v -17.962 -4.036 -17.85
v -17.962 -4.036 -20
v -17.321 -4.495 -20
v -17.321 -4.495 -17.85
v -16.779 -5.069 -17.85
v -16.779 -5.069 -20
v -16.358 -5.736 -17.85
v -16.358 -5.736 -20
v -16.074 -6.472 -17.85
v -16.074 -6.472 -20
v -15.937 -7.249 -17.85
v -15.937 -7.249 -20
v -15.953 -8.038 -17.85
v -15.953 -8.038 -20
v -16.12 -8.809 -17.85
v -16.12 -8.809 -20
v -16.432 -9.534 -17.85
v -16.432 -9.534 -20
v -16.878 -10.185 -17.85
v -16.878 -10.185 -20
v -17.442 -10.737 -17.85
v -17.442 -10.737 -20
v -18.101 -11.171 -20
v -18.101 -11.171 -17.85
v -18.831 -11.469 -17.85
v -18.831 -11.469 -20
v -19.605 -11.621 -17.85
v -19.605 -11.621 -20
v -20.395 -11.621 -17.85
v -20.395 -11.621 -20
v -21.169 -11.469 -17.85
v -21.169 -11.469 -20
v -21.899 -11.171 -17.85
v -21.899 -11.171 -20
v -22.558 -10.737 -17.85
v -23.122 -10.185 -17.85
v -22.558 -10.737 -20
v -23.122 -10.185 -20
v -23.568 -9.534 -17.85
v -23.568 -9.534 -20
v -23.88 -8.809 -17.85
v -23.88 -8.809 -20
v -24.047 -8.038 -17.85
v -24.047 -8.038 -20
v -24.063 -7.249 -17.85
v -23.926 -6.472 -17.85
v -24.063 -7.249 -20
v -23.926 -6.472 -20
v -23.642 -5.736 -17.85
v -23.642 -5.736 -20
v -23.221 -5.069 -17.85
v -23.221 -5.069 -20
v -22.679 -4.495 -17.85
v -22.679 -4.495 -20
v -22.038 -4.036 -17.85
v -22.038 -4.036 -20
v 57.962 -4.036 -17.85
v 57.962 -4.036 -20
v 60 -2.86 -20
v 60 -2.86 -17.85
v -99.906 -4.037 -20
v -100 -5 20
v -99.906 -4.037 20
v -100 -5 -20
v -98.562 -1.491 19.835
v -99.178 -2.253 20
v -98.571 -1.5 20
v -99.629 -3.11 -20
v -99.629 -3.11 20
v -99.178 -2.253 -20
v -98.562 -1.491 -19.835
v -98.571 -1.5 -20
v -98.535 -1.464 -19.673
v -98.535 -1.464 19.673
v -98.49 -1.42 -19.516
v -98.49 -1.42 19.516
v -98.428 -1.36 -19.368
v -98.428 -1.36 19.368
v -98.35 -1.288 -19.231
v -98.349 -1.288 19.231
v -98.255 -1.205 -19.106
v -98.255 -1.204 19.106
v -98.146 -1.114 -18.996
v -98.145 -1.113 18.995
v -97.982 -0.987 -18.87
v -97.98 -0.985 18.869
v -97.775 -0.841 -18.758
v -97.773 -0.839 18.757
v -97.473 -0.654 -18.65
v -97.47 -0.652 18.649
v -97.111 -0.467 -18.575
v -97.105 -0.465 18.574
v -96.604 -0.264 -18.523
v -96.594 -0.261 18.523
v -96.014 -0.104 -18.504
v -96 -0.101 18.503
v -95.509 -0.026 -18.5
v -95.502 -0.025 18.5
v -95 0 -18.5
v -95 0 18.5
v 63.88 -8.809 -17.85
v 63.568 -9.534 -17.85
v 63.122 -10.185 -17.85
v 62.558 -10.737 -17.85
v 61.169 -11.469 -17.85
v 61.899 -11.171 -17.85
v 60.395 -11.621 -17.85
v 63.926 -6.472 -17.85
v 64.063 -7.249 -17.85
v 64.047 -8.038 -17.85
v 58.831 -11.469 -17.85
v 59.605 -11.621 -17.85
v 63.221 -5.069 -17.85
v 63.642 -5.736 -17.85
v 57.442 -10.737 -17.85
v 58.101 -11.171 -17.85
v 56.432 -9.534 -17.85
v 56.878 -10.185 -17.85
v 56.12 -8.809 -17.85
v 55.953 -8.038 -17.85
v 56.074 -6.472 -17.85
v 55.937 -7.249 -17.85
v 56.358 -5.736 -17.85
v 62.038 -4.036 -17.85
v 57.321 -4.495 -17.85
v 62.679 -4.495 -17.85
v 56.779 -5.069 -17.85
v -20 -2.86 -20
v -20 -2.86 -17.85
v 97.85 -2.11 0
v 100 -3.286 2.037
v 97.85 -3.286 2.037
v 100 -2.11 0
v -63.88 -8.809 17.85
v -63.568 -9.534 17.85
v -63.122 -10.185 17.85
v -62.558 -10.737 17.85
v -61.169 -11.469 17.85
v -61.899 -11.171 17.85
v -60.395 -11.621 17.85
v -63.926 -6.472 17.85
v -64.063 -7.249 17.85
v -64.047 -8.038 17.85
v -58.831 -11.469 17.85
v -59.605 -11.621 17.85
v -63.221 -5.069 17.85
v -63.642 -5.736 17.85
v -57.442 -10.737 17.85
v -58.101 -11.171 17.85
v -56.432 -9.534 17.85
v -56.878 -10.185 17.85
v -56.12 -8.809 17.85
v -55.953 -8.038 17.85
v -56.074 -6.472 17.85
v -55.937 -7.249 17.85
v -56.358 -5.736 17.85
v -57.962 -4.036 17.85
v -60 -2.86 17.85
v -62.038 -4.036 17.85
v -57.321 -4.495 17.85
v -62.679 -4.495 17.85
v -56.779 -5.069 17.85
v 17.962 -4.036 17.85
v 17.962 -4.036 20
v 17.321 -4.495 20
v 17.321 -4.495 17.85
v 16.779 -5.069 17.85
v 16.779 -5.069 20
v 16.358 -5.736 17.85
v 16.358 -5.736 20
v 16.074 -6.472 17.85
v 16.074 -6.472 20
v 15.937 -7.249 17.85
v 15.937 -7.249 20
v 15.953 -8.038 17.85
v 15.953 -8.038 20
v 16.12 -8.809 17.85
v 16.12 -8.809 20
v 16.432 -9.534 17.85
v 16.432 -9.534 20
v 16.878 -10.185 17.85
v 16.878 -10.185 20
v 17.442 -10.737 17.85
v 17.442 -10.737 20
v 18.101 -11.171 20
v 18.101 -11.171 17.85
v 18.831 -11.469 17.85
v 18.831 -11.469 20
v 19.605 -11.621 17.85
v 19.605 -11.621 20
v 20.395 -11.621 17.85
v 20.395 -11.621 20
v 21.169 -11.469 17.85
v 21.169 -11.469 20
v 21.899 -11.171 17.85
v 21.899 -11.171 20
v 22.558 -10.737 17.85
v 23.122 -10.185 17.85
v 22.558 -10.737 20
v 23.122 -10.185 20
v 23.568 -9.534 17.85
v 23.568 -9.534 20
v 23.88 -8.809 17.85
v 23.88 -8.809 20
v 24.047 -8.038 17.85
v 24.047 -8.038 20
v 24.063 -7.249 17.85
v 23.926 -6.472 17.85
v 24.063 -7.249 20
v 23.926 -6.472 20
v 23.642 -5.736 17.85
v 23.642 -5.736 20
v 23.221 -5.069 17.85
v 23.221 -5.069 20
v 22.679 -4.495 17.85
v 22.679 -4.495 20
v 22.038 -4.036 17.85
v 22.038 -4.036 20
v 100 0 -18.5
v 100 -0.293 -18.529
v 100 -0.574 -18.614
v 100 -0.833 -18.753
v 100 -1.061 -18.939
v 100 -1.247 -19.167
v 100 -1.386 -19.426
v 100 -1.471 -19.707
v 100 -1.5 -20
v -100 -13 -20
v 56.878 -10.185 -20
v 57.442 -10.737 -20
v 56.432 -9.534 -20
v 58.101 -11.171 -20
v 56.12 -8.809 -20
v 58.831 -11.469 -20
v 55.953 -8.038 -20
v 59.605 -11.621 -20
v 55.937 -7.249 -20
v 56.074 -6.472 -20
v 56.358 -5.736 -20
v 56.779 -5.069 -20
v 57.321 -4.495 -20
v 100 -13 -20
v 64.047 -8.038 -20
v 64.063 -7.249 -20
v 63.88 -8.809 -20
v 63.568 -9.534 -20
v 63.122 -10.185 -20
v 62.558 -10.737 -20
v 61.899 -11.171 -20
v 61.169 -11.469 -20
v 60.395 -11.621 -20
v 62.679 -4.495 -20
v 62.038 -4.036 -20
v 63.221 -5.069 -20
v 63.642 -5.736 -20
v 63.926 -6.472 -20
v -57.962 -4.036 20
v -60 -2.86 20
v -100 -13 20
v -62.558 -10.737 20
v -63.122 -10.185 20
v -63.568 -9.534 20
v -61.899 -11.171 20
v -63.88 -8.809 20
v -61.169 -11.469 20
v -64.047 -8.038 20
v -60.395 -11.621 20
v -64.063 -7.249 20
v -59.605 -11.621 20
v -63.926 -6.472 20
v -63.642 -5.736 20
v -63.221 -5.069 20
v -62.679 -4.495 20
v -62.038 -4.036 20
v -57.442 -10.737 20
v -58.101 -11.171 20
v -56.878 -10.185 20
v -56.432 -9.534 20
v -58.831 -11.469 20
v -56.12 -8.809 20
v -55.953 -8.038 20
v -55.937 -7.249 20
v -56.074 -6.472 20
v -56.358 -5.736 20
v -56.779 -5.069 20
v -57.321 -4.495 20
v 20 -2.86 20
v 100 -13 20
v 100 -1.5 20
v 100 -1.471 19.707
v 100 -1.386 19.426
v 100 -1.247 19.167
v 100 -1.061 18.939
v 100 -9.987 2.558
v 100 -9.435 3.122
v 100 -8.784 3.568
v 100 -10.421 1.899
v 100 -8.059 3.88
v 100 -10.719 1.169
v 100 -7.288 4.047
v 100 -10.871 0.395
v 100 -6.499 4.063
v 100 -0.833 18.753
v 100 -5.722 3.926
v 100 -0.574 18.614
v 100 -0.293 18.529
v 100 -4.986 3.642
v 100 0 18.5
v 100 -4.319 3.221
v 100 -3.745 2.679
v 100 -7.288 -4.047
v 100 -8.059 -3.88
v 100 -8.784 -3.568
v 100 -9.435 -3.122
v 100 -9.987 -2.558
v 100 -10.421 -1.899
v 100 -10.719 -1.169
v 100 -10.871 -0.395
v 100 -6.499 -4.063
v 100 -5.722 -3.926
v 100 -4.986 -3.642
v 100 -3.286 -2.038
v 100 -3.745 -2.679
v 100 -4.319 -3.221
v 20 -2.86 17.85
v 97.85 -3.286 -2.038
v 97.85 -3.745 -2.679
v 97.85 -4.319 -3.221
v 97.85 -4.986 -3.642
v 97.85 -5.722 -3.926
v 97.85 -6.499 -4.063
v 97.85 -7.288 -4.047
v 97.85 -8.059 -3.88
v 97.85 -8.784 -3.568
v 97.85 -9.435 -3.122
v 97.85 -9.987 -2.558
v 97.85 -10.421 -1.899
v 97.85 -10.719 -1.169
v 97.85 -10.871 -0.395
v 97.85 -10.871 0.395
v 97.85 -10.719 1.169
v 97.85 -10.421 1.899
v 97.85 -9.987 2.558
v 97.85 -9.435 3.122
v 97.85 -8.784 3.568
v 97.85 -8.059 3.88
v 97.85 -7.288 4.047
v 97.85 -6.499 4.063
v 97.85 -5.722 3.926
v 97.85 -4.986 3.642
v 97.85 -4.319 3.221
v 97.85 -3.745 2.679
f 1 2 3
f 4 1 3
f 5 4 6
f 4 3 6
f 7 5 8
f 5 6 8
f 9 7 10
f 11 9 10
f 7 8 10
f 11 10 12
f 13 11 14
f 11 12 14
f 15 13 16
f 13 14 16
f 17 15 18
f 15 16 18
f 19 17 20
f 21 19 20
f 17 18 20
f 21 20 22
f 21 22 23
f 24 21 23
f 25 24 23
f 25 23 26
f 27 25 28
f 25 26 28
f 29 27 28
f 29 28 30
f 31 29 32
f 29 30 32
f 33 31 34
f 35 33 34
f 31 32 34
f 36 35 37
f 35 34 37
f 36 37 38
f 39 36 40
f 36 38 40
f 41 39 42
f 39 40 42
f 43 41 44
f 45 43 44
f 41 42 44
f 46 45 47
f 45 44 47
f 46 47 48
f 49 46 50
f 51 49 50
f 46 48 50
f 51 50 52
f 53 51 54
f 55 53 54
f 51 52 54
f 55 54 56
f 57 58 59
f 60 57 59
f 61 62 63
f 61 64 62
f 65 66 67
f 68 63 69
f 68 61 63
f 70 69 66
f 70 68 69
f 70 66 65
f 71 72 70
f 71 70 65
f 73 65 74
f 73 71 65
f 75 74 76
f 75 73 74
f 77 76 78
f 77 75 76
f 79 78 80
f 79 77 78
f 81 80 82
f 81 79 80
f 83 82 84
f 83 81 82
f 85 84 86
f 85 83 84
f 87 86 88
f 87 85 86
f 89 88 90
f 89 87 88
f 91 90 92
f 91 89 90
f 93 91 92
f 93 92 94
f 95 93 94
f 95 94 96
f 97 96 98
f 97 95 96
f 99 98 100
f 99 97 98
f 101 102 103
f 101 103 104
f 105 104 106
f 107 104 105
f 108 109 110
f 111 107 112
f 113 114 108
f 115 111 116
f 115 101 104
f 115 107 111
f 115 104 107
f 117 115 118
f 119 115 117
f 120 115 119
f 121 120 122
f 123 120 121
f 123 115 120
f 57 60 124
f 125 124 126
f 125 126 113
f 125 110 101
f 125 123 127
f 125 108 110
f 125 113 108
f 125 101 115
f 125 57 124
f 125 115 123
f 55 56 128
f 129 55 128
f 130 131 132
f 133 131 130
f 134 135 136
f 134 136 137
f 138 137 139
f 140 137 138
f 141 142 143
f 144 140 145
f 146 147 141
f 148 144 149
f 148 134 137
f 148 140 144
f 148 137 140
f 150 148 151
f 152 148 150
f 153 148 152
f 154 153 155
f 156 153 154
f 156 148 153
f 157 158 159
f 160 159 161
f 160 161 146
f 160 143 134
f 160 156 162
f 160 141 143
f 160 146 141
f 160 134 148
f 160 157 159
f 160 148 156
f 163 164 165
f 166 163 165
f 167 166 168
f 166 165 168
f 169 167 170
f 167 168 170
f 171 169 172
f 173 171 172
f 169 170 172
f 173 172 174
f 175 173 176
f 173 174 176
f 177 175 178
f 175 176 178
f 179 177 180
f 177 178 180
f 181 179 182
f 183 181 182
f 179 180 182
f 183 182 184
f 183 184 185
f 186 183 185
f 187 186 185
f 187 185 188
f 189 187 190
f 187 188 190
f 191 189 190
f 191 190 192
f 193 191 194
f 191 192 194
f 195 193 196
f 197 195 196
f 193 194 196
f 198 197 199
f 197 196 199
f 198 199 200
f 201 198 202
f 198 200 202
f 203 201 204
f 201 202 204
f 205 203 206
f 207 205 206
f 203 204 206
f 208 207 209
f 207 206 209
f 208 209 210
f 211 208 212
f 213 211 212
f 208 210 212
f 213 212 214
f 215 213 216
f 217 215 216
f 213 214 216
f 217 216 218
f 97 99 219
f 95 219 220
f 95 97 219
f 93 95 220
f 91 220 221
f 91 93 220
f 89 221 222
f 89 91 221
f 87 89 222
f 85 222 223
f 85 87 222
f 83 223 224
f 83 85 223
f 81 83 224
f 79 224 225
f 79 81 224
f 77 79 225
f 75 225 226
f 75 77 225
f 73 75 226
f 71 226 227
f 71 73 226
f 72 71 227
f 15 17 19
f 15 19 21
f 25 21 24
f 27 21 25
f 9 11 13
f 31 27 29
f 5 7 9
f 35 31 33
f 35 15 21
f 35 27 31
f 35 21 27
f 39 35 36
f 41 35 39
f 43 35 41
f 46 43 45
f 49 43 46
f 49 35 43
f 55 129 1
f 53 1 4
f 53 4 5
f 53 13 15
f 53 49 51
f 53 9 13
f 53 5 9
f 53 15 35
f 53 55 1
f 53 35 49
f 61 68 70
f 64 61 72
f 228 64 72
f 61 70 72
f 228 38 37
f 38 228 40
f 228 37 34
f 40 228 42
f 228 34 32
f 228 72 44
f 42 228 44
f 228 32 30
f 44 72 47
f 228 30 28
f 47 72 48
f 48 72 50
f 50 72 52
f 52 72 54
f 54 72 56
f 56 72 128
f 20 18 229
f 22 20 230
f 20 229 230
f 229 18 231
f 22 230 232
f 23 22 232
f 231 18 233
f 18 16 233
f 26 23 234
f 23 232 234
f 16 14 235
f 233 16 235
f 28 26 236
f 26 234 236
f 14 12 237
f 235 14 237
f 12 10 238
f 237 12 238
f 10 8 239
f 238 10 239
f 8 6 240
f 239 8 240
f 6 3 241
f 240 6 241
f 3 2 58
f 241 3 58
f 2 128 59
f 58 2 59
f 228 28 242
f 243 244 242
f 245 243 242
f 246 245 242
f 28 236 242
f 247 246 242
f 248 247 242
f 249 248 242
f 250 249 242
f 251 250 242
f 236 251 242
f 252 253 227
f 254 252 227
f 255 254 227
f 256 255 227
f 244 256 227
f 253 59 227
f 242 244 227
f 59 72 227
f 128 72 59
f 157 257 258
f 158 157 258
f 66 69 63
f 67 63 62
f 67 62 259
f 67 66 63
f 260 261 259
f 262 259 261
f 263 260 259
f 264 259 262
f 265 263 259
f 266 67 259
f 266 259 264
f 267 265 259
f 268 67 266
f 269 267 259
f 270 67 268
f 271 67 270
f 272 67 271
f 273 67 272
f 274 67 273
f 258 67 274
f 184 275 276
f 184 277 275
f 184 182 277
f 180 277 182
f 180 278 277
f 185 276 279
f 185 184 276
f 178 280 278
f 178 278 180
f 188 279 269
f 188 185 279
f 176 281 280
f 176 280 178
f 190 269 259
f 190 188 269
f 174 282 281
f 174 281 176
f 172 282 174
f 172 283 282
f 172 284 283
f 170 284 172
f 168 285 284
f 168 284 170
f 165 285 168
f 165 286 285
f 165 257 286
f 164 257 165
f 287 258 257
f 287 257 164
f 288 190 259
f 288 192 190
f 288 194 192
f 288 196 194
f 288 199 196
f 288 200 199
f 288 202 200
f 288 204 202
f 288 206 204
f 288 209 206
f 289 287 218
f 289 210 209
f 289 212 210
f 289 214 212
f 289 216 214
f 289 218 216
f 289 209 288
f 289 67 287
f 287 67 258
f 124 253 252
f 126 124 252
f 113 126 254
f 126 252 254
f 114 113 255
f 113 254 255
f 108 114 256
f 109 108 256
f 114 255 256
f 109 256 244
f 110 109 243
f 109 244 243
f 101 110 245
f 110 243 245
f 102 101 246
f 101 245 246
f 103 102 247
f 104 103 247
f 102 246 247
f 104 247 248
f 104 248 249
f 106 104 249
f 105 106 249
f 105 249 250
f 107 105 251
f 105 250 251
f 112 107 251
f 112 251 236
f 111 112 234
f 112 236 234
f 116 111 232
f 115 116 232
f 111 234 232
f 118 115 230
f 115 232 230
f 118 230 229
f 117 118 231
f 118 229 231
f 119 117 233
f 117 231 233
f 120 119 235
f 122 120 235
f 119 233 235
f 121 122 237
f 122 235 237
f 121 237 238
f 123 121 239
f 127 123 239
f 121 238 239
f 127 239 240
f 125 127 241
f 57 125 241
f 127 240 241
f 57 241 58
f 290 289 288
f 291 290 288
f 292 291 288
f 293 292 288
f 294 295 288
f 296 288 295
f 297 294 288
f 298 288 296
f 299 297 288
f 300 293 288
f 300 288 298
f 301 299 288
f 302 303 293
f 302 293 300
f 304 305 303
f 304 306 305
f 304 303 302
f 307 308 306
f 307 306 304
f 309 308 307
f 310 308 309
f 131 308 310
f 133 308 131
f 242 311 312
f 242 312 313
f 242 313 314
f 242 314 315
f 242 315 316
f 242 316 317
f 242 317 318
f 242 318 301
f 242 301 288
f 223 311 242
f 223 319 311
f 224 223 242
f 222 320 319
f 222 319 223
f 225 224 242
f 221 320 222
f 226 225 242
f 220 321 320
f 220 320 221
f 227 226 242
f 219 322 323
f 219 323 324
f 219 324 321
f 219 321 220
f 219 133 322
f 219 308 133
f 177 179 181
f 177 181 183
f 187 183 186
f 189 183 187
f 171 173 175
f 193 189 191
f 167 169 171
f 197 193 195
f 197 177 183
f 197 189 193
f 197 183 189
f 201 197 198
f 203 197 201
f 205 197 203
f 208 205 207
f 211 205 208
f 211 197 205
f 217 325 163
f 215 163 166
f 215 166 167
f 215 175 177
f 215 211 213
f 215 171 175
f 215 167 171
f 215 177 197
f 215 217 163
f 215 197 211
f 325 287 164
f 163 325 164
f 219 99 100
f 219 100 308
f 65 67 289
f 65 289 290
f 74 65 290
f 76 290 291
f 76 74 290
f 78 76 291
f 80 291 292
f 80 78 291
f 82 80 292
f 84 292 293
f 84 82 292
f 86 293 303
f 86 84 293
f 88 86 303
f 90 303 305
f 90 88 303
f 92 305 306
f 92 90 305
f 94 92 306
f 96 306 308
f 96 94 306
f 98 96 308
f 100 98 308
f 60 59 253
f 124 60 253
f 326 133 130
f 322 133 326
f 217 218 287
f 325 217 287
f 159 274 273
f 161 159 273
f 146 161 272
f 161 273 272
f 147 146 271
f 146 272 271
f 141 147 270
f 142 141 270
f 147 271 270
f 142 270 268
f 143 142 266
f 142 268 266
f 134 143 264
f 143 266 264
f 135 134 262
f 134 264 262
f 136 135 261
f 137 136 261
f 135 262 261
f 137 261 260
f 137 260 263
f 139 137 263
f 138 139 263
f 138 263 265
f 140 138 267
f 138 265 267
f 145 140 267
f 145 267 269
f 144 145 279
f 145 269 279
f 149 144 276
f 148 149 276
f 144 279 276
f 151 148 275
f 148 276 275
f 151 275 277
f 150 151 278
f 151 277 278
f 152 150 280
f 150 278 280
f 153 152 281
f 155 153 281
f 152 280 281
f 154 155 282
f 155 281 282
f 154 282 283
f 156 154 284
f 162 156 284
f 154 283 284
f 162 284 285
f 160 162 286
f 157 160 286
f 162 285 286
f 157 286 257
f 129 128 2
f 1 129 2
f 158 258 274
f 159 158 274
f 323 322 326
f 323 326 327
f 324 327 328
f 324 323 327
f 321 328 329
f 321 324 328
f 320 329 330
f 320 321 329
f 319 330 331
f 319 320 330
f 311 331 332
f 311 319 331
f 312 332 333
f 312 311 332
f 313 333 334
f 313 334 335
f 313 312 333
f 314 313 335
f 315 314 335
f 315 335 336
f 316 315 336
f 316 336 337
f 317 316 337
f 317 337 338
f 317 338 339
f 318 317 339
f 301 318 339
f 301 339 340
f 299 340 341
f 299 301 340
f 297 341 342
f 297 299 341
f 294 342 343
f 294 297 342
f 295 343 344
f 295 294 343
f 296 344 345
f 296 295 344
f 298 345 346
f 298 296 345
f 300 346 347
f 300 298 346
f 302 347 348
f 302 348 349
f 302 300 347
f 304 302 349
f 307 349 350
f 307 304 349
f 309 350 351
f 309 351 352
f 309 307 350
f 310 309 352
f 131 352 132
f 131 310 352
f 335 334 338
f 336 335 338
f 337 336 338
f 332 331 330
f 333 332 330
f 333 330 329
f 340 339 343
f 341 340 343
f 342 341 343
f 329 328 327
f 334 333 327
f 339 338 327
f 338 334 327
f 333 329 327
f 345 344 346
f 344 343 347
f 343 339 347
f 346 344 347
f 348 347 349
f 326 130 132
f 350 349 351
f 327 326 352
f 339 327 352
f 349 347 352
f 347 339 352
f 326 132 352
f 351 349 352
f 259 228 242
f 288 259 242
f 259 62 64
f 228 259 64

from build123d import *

# Parameters (mm, degrees)
SKETCH_1_W                         = 200
SKETCH_1_H                         = 40
EXTRUDE_1_DEPTH                    = 13
SWEEP_START                        = -100
SWEEP_1_DEPTH                      = 200
SWEEP_2_DEPTH                      = 200
SKETCH_16_R                        = 4.075
CUT_EXTRUDE_1_DEPTH                = 2.15
PATTERN_LINEAR_1_COUNT             = 2
PATTERN_LINEAR_1_PITCH             = 80
PATTERN_CIRCULAR_1_COUNT           = 2
PATTERN_CIRCULAR_1_COPY_1_SKETCH_R = 4.075
PATTERN_CIRCULAR_1_COPY_1_DEPTH    = 2.15
SKETCH_20_R                        = 4.075
CUT_EXTRUDE_2_DEPTH                = 2.15
FILLET_1_R                         = 5


# Read off the part's stored shape, not the designer's step: Вырез-По траектории1, Вырез-По траектории2
with BuildPart() as part:
    # Эскиз1 → Бобышка-Вытянуть1 (new body)
    with BuildSketch(Plane(origin=(0, 0, 0), x_dir=(1, 0, 0), z_dir=(0, 1, 0))):
        Rectangle(SKETCH_1_W, SKETCH_1_H)
    extrude(amount=-EXTRUDE_1_DEPTH)

    # Вырез-По траектории1 outline → Вырез-По траектории1 (cut)
    with BuildSketch(Plane.YZ.offset(SWEEP_START)):
        with BuildLine():
            Line((0, 20), (-1.5, 20))
            ThreePointArc((-1.5, 20), (-1.060660172, 18.939339828), (0, 18.5))
            Line((0, 18.5), (0, 20))
        make_face()
    extrude(amount=SWEEP_1_DEPTH, mode=Mode.SUBTRACT)

    # Вырез-По траектории2 outline → Вырез-По траектории2 (cut)
    with BuildSketch(Plane.YZ.offset(SWEEP_START)):
        with BuildLine():
            ThreePointArc((0, -18.5), (-1.060660172, -18.939339828), (-1.5, -20))
            Line((-1.5, -20), (0, -20))
            Line((0, -20), (0, -18.5))
        make_face()
    extrude(amount=SWEEP_2_DEPTH, mode=Mode.SUBTRACT)

    # Эскиз16 → Вырез-Вытянуть1 (cut)
    with BuildSketch(Plane(origin=(0, 0, -20), x_dir=(-1, 0, 0), z_dir=(0, 0, -1))):
        with Locations((-60, -7.565202347)):
            Circle(SKETCH_16_R)
        with BuildLine():
            Line((-60, -2.859797653), (-62.0375, -4.036148827))
            ThreePointArc((-62.0375, -4.036148827), (-60, -3.490202347), (-57.9625, -4.036148827))
            Line((-57.9625, -4.036148827), (-60, -2.859797653))
        make_face()
    cut_extrude_1 = extrude(amount=-CUT_EXTRUDE_1_DEPTH, mode=Mode.SUBTRACT)

    # Линейный массив1: Вырез-Вытянуть1 ×2
    with Locations(*[(-i * PATTERN_LINEAR_1_PITCH, 0, 0) for i in range(1, PATTERN_LINEAR_1_COUNT)]):
        add(cut_extrude_1, mode=Mode.SUBTRACT)

    # Круговой массив1: Вырез-Вытянуть1 ×2 about axis
    pattern_circular_1_axis = Axis((0, -13, 0), (0, -1, 0))
    for i in range(1, PATTERN_CIRCULAR_1_COUNT):
        add(cut_extrude_1.rotate(pattern_circular_1_axis, i * 360 / PATTERN_CIRCULAR_1_COUNT), mode=Mode.SUBTRACT)

    # Круговой массив1 copy 1 sketch → Круговой массив1 copy 1 (cut)
    with BuildSketch(Plane(origin=(80, 0, 20), x_dir=(1, 0, 0), z_dir=(0, 0, 1))):
        with Locations((-60, -7.565202347)):
            Circle(PATTERN_CIRCULAR_1_COPY_1_SKETCH_R)
        with BuildLine():
            Line((-60, -2.859797653), (-62.0375, -4.036148827))
            ThreePointArc((-62.0375, -4.036148827), (-60, -3.490202347), (-57.9625, -4.036148827))
            Line((-57.9625, -4.036148827), (-60, -2.859797653))
        make_face()
    extrude(amount=-PATTERN_CIRCULAR_1_COPY_1_DEPTH, mode=Mode.SUBTRACT)

    # Эскиз20 → Вырез-Вытянуть2 (cut)
    with BuildSketch(Plane.ZY.offset(-100)):
        with Locations((0, -6.815202347)):
            Circle(SKETCH_20_R)
        with BuildLine():
            Line((2.0375, -3.286148827), (0, -2.109797653))
            Line((0, -2.109797653), (-2.0375, -3.286148827))
            ThreePointArc((-2.0375, -3.286148827), (0, -2.740202347), (2.0375, -3.286148827))
        make_face()
    extrude(amount=CUT_EXTRUDE_2_DEPTH, mode=Mode.SUBTRACT)

    # Скругление1
    fillet_1_edges = [part.edges().sort_by_distance(p)[0] for p in [
        (-100, 0, 0),
    ]]
    fillet(fillet_1_edges, radius=FILLET_1_R)


solid = part.part
